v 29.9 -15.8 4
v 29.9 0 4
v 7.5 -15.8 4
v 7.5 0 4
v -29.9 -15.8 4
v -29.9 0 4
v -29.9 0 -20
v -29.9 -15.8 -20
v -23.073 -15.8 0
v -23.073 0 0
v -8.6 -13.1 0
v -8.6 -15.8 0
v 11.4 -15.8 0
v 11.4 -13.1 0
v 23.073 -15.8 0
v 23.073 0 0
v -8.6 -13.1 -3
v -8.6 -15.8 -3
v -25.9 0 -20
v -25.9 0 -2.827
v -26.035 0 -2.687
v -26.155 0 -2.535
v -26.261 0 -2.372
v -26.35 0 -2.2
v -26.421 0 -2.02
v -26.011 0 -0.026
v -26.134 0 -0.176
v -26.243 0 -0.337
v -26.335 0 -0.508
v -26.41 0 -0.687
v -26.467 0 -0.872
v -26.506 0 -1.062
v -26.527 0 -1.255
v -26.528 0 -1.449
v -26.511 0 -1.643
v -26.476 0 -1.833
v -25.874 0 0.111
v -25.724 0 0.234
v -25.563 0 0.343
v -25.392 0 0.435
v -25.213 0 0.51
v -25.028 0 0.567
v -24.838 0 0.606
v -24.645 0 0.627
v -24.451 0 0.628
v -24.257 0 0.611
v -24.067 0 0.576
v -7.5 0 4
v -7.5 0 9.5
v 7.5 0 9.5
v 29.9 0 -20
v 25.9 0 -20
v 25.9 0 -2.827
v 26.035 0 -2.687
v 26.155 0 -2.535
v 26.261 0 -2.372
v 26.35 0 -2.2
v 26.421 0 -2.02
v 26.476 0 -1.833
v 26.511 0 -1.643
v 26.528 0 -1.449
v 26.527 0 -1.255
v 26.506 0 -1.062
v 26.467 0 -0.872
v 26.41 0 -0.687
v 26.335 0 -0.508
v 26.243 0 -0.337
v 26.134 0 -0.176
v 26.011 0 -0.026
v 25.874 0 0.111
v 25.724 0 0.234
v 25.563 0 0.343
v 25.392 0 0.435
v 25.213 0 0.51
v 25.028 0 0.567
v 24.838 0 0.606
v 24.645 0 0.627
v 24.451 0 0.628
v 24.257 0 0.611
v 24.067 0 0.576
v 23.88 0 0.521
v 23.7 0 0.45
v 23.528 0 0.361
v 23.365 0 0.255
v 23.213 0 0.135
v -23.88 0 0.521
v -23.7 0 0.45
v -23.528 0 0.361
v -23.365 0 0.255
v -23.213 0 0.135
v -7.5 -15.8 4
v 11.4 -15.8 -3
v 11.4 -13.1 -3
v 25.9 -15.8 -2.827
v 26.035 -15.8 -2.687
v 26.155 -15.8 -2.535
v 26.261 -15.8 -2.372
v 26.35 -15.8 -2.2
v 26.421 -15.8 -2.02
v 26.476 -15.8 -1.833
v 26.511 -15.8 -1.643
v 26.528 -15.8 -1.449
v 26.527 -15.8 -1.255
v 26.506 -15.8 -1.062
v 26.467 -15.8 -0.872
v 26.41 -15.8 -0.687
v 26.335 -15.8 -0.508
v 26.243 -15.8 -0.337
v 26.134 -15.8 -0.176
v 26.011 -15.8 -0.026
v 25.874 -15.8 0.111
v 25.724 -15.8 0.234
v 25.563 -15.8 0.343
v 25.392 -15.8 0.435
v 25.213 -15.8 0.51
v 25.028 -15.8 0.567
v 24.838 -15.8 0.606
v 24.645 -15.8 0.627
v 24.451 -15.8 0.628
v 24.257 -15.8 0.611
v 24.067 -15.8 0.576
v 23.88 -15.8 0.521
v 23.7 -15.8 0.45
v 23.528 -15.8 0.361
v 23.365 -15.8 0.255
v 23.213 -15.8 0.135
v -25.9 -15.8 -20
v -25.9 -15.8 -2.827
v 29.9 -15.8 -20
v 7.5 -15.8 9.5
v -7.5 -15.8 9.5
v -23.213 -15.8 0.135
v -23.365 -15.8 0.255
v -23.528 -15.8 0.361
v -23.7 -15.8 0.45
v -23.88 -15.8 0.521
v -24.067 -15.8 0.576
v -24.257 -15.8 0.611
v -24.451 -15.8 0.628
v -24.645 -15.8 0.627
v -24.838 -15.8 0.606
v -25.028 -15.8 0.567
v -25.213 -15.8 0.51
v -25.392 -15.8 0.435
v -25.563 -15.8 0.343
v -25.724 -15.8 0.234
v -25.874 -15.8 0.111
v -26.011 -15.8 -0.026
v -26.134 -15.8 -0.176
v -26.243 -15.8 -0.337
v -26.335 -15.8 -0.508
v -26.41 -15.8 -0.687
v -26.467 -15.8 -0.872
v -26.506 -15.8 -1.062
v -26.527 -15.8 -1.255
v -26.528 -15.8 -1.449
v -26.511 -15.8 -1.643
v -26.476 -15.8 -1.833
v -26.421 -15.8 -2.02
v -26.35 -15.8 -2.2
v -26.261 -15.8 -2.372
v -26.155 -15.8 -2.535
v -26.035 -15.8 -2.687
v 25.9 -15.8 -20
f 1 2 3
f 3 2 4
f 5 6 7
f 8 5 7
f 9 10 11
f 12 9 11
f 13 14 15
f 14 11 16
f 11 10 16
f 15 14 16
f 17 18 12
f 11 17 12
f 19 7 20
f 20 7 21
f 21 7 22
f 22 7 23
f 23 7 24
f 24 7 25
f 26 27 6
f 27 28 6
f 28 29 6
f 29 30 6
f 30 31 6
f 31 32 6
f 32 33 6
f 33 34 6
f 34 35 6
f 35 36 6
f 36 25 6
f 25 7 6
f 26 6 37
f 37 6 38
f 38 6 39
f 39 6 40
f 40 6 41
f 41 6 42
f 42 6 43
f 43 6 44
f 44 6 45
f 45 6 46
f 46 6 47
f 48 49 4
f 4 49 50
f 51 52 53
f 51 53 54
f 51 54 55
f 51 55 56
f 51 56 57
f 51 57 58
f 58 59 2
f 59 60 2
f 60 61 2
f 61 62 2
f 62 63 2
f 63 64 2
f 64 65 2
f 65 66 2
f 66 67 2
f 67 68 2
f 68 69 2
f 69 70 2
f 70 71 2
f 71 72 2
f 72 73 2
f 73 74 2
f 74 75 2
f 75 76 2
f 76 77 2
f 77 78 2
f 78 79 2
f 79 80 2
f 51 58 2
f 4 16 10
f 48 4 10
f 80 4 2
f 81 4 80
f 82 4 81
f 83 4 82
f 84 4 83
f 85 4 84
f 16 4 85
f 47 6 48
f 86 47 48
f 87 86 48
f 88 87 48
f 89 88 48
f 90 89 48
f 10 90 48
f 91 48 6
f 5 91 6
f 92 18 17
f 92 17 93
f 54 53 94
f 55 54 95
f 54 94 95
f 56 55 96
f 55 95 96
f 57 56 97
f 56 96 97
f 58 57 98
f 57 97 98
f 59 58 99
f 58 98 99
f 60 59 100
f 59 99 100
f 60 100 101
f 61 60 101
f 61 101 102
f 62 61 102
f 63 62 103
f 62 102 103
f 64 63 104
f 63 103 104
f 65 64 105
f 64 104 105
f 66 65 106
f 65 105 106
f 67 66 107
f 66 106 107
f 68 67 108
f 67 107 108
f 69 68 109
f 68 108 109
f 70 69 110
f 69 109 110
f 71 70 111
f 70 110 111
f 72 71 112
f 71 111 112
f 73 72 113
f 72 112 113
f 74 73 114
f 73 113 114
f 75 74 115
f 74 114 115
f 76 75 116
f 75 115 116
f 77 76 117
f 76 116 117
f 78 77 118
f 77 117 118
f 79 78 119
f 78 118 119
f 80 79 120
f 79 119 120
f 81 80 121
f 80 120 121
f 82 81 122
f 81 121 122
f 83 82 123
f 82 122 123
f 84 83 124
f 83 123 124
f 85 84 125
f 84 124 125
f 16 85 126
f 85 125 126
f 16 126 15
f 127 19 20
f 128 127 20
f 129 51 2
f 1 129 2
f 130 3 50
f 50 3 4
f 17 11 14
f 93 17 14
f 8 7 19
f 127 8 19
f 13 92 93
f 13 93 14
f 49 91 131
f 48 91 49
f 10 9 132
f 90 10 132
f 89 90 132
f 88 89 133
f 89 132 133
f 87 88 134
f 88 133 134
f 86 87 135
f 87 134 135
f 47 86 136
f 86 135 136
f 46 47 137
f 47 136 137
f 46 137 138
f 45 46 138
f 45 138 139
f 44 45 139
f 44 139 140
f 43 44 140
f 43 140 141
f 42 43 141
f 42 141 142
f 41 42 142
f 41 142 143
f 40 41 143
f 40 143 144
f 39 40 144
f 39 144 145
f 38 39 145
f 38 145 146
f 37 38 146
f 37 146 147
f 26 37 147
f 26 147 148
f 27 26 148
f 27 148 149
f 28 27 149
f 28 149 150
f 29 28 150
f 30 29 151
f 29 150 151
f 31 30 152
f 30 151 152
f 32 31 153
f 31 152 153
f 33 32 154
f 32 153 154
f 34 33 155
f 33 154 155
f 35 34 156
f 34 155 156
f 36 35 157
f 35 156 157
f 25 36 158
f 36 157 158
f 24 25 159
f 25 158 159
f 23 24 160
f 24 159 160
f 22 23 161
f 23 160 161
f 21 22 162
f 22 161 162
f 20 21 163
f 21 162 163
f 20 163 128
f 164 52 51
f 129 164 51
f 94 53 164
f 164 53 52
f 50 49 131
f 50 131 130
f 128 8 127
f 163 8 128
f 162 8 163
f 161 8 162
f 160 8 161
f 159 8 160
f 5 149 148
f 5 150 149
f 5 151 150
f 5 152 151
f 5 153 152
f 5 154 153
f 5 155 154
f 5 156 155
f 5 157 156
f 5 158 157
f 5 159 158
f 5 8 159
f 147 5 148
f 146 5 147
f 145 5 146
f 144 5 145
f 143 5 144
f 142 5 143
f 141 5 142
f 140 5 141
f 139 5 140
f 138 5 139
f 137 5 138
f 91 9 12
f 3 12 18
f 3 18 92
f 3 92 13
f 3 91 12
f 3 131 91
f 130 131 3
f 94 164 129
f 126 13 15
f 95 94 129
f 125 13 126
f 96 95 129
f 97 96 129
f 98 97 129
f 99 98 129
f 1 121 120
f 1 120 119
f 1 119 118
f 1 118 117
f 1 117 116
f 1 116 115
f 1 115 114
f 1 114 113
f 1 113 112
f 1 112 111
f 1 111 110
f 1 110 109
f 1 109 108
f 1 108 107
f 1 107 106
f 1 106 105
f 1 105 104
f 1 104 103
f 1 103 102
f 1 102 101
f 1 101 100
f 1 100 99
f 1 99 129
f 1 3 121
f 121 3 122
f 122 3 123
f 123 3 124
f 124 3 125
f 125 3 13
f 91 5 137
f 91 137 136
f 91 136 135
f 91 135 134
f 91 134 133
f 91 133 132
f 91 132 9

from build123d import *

# Parameters (mm, degrees)
F1_DEPTH = 15.8
F2_W     = 20
F2_H     = 3
F3_DEPTH = 2.7
F4_W     = 15
F4_H     = 15.8
F5_DEPTH = 5.5
F6_R     = 2
F7_DEPTH = 15.801


with BuildPart() as f1:
    # F0 (on Front) → F1 (new body)
    with BuildSketch(Plane.XZ):
        Polygon((-25.9, -20), (-25.9, 0), (25.9, 0), (25.9, -20), (29.9, -20), (29.9, 4), (-29.9, 4), (-29.9, -20), align=None)
    extrude(amount=F1_DEPTH)

    # F2 (on face) → F3 (join)
    with BuildSketch(Plane.XZ.offset(15.8)):
        with Locations((1.4, -1.5)):
            Rectangle(F2_W, F2_H)
    extrude(amount=-F3_DEPTH)

    # F4 (on face) → F5 (join)
    with BuildSketch(Plane.XY.offset(4)):
        with Locations((0, -7.9)):
            Rectangle(F4_W, F4_H)
    extrude(amount=F5_DEPTH)

    # F6 (on face) → F7 (cut, through all)
    with BuildSketch(Plane.XZ.offset(15.8)):
        with Locations((-24.52996, -1.37004)):
            Circle(F6_R)
        with Locations((24.52996, -1.37004)):
            Circle(F6_R)
    extrude(amount=-F7_DEPTH, mode=Mode.SUBTRACT)


solid = f1.part
